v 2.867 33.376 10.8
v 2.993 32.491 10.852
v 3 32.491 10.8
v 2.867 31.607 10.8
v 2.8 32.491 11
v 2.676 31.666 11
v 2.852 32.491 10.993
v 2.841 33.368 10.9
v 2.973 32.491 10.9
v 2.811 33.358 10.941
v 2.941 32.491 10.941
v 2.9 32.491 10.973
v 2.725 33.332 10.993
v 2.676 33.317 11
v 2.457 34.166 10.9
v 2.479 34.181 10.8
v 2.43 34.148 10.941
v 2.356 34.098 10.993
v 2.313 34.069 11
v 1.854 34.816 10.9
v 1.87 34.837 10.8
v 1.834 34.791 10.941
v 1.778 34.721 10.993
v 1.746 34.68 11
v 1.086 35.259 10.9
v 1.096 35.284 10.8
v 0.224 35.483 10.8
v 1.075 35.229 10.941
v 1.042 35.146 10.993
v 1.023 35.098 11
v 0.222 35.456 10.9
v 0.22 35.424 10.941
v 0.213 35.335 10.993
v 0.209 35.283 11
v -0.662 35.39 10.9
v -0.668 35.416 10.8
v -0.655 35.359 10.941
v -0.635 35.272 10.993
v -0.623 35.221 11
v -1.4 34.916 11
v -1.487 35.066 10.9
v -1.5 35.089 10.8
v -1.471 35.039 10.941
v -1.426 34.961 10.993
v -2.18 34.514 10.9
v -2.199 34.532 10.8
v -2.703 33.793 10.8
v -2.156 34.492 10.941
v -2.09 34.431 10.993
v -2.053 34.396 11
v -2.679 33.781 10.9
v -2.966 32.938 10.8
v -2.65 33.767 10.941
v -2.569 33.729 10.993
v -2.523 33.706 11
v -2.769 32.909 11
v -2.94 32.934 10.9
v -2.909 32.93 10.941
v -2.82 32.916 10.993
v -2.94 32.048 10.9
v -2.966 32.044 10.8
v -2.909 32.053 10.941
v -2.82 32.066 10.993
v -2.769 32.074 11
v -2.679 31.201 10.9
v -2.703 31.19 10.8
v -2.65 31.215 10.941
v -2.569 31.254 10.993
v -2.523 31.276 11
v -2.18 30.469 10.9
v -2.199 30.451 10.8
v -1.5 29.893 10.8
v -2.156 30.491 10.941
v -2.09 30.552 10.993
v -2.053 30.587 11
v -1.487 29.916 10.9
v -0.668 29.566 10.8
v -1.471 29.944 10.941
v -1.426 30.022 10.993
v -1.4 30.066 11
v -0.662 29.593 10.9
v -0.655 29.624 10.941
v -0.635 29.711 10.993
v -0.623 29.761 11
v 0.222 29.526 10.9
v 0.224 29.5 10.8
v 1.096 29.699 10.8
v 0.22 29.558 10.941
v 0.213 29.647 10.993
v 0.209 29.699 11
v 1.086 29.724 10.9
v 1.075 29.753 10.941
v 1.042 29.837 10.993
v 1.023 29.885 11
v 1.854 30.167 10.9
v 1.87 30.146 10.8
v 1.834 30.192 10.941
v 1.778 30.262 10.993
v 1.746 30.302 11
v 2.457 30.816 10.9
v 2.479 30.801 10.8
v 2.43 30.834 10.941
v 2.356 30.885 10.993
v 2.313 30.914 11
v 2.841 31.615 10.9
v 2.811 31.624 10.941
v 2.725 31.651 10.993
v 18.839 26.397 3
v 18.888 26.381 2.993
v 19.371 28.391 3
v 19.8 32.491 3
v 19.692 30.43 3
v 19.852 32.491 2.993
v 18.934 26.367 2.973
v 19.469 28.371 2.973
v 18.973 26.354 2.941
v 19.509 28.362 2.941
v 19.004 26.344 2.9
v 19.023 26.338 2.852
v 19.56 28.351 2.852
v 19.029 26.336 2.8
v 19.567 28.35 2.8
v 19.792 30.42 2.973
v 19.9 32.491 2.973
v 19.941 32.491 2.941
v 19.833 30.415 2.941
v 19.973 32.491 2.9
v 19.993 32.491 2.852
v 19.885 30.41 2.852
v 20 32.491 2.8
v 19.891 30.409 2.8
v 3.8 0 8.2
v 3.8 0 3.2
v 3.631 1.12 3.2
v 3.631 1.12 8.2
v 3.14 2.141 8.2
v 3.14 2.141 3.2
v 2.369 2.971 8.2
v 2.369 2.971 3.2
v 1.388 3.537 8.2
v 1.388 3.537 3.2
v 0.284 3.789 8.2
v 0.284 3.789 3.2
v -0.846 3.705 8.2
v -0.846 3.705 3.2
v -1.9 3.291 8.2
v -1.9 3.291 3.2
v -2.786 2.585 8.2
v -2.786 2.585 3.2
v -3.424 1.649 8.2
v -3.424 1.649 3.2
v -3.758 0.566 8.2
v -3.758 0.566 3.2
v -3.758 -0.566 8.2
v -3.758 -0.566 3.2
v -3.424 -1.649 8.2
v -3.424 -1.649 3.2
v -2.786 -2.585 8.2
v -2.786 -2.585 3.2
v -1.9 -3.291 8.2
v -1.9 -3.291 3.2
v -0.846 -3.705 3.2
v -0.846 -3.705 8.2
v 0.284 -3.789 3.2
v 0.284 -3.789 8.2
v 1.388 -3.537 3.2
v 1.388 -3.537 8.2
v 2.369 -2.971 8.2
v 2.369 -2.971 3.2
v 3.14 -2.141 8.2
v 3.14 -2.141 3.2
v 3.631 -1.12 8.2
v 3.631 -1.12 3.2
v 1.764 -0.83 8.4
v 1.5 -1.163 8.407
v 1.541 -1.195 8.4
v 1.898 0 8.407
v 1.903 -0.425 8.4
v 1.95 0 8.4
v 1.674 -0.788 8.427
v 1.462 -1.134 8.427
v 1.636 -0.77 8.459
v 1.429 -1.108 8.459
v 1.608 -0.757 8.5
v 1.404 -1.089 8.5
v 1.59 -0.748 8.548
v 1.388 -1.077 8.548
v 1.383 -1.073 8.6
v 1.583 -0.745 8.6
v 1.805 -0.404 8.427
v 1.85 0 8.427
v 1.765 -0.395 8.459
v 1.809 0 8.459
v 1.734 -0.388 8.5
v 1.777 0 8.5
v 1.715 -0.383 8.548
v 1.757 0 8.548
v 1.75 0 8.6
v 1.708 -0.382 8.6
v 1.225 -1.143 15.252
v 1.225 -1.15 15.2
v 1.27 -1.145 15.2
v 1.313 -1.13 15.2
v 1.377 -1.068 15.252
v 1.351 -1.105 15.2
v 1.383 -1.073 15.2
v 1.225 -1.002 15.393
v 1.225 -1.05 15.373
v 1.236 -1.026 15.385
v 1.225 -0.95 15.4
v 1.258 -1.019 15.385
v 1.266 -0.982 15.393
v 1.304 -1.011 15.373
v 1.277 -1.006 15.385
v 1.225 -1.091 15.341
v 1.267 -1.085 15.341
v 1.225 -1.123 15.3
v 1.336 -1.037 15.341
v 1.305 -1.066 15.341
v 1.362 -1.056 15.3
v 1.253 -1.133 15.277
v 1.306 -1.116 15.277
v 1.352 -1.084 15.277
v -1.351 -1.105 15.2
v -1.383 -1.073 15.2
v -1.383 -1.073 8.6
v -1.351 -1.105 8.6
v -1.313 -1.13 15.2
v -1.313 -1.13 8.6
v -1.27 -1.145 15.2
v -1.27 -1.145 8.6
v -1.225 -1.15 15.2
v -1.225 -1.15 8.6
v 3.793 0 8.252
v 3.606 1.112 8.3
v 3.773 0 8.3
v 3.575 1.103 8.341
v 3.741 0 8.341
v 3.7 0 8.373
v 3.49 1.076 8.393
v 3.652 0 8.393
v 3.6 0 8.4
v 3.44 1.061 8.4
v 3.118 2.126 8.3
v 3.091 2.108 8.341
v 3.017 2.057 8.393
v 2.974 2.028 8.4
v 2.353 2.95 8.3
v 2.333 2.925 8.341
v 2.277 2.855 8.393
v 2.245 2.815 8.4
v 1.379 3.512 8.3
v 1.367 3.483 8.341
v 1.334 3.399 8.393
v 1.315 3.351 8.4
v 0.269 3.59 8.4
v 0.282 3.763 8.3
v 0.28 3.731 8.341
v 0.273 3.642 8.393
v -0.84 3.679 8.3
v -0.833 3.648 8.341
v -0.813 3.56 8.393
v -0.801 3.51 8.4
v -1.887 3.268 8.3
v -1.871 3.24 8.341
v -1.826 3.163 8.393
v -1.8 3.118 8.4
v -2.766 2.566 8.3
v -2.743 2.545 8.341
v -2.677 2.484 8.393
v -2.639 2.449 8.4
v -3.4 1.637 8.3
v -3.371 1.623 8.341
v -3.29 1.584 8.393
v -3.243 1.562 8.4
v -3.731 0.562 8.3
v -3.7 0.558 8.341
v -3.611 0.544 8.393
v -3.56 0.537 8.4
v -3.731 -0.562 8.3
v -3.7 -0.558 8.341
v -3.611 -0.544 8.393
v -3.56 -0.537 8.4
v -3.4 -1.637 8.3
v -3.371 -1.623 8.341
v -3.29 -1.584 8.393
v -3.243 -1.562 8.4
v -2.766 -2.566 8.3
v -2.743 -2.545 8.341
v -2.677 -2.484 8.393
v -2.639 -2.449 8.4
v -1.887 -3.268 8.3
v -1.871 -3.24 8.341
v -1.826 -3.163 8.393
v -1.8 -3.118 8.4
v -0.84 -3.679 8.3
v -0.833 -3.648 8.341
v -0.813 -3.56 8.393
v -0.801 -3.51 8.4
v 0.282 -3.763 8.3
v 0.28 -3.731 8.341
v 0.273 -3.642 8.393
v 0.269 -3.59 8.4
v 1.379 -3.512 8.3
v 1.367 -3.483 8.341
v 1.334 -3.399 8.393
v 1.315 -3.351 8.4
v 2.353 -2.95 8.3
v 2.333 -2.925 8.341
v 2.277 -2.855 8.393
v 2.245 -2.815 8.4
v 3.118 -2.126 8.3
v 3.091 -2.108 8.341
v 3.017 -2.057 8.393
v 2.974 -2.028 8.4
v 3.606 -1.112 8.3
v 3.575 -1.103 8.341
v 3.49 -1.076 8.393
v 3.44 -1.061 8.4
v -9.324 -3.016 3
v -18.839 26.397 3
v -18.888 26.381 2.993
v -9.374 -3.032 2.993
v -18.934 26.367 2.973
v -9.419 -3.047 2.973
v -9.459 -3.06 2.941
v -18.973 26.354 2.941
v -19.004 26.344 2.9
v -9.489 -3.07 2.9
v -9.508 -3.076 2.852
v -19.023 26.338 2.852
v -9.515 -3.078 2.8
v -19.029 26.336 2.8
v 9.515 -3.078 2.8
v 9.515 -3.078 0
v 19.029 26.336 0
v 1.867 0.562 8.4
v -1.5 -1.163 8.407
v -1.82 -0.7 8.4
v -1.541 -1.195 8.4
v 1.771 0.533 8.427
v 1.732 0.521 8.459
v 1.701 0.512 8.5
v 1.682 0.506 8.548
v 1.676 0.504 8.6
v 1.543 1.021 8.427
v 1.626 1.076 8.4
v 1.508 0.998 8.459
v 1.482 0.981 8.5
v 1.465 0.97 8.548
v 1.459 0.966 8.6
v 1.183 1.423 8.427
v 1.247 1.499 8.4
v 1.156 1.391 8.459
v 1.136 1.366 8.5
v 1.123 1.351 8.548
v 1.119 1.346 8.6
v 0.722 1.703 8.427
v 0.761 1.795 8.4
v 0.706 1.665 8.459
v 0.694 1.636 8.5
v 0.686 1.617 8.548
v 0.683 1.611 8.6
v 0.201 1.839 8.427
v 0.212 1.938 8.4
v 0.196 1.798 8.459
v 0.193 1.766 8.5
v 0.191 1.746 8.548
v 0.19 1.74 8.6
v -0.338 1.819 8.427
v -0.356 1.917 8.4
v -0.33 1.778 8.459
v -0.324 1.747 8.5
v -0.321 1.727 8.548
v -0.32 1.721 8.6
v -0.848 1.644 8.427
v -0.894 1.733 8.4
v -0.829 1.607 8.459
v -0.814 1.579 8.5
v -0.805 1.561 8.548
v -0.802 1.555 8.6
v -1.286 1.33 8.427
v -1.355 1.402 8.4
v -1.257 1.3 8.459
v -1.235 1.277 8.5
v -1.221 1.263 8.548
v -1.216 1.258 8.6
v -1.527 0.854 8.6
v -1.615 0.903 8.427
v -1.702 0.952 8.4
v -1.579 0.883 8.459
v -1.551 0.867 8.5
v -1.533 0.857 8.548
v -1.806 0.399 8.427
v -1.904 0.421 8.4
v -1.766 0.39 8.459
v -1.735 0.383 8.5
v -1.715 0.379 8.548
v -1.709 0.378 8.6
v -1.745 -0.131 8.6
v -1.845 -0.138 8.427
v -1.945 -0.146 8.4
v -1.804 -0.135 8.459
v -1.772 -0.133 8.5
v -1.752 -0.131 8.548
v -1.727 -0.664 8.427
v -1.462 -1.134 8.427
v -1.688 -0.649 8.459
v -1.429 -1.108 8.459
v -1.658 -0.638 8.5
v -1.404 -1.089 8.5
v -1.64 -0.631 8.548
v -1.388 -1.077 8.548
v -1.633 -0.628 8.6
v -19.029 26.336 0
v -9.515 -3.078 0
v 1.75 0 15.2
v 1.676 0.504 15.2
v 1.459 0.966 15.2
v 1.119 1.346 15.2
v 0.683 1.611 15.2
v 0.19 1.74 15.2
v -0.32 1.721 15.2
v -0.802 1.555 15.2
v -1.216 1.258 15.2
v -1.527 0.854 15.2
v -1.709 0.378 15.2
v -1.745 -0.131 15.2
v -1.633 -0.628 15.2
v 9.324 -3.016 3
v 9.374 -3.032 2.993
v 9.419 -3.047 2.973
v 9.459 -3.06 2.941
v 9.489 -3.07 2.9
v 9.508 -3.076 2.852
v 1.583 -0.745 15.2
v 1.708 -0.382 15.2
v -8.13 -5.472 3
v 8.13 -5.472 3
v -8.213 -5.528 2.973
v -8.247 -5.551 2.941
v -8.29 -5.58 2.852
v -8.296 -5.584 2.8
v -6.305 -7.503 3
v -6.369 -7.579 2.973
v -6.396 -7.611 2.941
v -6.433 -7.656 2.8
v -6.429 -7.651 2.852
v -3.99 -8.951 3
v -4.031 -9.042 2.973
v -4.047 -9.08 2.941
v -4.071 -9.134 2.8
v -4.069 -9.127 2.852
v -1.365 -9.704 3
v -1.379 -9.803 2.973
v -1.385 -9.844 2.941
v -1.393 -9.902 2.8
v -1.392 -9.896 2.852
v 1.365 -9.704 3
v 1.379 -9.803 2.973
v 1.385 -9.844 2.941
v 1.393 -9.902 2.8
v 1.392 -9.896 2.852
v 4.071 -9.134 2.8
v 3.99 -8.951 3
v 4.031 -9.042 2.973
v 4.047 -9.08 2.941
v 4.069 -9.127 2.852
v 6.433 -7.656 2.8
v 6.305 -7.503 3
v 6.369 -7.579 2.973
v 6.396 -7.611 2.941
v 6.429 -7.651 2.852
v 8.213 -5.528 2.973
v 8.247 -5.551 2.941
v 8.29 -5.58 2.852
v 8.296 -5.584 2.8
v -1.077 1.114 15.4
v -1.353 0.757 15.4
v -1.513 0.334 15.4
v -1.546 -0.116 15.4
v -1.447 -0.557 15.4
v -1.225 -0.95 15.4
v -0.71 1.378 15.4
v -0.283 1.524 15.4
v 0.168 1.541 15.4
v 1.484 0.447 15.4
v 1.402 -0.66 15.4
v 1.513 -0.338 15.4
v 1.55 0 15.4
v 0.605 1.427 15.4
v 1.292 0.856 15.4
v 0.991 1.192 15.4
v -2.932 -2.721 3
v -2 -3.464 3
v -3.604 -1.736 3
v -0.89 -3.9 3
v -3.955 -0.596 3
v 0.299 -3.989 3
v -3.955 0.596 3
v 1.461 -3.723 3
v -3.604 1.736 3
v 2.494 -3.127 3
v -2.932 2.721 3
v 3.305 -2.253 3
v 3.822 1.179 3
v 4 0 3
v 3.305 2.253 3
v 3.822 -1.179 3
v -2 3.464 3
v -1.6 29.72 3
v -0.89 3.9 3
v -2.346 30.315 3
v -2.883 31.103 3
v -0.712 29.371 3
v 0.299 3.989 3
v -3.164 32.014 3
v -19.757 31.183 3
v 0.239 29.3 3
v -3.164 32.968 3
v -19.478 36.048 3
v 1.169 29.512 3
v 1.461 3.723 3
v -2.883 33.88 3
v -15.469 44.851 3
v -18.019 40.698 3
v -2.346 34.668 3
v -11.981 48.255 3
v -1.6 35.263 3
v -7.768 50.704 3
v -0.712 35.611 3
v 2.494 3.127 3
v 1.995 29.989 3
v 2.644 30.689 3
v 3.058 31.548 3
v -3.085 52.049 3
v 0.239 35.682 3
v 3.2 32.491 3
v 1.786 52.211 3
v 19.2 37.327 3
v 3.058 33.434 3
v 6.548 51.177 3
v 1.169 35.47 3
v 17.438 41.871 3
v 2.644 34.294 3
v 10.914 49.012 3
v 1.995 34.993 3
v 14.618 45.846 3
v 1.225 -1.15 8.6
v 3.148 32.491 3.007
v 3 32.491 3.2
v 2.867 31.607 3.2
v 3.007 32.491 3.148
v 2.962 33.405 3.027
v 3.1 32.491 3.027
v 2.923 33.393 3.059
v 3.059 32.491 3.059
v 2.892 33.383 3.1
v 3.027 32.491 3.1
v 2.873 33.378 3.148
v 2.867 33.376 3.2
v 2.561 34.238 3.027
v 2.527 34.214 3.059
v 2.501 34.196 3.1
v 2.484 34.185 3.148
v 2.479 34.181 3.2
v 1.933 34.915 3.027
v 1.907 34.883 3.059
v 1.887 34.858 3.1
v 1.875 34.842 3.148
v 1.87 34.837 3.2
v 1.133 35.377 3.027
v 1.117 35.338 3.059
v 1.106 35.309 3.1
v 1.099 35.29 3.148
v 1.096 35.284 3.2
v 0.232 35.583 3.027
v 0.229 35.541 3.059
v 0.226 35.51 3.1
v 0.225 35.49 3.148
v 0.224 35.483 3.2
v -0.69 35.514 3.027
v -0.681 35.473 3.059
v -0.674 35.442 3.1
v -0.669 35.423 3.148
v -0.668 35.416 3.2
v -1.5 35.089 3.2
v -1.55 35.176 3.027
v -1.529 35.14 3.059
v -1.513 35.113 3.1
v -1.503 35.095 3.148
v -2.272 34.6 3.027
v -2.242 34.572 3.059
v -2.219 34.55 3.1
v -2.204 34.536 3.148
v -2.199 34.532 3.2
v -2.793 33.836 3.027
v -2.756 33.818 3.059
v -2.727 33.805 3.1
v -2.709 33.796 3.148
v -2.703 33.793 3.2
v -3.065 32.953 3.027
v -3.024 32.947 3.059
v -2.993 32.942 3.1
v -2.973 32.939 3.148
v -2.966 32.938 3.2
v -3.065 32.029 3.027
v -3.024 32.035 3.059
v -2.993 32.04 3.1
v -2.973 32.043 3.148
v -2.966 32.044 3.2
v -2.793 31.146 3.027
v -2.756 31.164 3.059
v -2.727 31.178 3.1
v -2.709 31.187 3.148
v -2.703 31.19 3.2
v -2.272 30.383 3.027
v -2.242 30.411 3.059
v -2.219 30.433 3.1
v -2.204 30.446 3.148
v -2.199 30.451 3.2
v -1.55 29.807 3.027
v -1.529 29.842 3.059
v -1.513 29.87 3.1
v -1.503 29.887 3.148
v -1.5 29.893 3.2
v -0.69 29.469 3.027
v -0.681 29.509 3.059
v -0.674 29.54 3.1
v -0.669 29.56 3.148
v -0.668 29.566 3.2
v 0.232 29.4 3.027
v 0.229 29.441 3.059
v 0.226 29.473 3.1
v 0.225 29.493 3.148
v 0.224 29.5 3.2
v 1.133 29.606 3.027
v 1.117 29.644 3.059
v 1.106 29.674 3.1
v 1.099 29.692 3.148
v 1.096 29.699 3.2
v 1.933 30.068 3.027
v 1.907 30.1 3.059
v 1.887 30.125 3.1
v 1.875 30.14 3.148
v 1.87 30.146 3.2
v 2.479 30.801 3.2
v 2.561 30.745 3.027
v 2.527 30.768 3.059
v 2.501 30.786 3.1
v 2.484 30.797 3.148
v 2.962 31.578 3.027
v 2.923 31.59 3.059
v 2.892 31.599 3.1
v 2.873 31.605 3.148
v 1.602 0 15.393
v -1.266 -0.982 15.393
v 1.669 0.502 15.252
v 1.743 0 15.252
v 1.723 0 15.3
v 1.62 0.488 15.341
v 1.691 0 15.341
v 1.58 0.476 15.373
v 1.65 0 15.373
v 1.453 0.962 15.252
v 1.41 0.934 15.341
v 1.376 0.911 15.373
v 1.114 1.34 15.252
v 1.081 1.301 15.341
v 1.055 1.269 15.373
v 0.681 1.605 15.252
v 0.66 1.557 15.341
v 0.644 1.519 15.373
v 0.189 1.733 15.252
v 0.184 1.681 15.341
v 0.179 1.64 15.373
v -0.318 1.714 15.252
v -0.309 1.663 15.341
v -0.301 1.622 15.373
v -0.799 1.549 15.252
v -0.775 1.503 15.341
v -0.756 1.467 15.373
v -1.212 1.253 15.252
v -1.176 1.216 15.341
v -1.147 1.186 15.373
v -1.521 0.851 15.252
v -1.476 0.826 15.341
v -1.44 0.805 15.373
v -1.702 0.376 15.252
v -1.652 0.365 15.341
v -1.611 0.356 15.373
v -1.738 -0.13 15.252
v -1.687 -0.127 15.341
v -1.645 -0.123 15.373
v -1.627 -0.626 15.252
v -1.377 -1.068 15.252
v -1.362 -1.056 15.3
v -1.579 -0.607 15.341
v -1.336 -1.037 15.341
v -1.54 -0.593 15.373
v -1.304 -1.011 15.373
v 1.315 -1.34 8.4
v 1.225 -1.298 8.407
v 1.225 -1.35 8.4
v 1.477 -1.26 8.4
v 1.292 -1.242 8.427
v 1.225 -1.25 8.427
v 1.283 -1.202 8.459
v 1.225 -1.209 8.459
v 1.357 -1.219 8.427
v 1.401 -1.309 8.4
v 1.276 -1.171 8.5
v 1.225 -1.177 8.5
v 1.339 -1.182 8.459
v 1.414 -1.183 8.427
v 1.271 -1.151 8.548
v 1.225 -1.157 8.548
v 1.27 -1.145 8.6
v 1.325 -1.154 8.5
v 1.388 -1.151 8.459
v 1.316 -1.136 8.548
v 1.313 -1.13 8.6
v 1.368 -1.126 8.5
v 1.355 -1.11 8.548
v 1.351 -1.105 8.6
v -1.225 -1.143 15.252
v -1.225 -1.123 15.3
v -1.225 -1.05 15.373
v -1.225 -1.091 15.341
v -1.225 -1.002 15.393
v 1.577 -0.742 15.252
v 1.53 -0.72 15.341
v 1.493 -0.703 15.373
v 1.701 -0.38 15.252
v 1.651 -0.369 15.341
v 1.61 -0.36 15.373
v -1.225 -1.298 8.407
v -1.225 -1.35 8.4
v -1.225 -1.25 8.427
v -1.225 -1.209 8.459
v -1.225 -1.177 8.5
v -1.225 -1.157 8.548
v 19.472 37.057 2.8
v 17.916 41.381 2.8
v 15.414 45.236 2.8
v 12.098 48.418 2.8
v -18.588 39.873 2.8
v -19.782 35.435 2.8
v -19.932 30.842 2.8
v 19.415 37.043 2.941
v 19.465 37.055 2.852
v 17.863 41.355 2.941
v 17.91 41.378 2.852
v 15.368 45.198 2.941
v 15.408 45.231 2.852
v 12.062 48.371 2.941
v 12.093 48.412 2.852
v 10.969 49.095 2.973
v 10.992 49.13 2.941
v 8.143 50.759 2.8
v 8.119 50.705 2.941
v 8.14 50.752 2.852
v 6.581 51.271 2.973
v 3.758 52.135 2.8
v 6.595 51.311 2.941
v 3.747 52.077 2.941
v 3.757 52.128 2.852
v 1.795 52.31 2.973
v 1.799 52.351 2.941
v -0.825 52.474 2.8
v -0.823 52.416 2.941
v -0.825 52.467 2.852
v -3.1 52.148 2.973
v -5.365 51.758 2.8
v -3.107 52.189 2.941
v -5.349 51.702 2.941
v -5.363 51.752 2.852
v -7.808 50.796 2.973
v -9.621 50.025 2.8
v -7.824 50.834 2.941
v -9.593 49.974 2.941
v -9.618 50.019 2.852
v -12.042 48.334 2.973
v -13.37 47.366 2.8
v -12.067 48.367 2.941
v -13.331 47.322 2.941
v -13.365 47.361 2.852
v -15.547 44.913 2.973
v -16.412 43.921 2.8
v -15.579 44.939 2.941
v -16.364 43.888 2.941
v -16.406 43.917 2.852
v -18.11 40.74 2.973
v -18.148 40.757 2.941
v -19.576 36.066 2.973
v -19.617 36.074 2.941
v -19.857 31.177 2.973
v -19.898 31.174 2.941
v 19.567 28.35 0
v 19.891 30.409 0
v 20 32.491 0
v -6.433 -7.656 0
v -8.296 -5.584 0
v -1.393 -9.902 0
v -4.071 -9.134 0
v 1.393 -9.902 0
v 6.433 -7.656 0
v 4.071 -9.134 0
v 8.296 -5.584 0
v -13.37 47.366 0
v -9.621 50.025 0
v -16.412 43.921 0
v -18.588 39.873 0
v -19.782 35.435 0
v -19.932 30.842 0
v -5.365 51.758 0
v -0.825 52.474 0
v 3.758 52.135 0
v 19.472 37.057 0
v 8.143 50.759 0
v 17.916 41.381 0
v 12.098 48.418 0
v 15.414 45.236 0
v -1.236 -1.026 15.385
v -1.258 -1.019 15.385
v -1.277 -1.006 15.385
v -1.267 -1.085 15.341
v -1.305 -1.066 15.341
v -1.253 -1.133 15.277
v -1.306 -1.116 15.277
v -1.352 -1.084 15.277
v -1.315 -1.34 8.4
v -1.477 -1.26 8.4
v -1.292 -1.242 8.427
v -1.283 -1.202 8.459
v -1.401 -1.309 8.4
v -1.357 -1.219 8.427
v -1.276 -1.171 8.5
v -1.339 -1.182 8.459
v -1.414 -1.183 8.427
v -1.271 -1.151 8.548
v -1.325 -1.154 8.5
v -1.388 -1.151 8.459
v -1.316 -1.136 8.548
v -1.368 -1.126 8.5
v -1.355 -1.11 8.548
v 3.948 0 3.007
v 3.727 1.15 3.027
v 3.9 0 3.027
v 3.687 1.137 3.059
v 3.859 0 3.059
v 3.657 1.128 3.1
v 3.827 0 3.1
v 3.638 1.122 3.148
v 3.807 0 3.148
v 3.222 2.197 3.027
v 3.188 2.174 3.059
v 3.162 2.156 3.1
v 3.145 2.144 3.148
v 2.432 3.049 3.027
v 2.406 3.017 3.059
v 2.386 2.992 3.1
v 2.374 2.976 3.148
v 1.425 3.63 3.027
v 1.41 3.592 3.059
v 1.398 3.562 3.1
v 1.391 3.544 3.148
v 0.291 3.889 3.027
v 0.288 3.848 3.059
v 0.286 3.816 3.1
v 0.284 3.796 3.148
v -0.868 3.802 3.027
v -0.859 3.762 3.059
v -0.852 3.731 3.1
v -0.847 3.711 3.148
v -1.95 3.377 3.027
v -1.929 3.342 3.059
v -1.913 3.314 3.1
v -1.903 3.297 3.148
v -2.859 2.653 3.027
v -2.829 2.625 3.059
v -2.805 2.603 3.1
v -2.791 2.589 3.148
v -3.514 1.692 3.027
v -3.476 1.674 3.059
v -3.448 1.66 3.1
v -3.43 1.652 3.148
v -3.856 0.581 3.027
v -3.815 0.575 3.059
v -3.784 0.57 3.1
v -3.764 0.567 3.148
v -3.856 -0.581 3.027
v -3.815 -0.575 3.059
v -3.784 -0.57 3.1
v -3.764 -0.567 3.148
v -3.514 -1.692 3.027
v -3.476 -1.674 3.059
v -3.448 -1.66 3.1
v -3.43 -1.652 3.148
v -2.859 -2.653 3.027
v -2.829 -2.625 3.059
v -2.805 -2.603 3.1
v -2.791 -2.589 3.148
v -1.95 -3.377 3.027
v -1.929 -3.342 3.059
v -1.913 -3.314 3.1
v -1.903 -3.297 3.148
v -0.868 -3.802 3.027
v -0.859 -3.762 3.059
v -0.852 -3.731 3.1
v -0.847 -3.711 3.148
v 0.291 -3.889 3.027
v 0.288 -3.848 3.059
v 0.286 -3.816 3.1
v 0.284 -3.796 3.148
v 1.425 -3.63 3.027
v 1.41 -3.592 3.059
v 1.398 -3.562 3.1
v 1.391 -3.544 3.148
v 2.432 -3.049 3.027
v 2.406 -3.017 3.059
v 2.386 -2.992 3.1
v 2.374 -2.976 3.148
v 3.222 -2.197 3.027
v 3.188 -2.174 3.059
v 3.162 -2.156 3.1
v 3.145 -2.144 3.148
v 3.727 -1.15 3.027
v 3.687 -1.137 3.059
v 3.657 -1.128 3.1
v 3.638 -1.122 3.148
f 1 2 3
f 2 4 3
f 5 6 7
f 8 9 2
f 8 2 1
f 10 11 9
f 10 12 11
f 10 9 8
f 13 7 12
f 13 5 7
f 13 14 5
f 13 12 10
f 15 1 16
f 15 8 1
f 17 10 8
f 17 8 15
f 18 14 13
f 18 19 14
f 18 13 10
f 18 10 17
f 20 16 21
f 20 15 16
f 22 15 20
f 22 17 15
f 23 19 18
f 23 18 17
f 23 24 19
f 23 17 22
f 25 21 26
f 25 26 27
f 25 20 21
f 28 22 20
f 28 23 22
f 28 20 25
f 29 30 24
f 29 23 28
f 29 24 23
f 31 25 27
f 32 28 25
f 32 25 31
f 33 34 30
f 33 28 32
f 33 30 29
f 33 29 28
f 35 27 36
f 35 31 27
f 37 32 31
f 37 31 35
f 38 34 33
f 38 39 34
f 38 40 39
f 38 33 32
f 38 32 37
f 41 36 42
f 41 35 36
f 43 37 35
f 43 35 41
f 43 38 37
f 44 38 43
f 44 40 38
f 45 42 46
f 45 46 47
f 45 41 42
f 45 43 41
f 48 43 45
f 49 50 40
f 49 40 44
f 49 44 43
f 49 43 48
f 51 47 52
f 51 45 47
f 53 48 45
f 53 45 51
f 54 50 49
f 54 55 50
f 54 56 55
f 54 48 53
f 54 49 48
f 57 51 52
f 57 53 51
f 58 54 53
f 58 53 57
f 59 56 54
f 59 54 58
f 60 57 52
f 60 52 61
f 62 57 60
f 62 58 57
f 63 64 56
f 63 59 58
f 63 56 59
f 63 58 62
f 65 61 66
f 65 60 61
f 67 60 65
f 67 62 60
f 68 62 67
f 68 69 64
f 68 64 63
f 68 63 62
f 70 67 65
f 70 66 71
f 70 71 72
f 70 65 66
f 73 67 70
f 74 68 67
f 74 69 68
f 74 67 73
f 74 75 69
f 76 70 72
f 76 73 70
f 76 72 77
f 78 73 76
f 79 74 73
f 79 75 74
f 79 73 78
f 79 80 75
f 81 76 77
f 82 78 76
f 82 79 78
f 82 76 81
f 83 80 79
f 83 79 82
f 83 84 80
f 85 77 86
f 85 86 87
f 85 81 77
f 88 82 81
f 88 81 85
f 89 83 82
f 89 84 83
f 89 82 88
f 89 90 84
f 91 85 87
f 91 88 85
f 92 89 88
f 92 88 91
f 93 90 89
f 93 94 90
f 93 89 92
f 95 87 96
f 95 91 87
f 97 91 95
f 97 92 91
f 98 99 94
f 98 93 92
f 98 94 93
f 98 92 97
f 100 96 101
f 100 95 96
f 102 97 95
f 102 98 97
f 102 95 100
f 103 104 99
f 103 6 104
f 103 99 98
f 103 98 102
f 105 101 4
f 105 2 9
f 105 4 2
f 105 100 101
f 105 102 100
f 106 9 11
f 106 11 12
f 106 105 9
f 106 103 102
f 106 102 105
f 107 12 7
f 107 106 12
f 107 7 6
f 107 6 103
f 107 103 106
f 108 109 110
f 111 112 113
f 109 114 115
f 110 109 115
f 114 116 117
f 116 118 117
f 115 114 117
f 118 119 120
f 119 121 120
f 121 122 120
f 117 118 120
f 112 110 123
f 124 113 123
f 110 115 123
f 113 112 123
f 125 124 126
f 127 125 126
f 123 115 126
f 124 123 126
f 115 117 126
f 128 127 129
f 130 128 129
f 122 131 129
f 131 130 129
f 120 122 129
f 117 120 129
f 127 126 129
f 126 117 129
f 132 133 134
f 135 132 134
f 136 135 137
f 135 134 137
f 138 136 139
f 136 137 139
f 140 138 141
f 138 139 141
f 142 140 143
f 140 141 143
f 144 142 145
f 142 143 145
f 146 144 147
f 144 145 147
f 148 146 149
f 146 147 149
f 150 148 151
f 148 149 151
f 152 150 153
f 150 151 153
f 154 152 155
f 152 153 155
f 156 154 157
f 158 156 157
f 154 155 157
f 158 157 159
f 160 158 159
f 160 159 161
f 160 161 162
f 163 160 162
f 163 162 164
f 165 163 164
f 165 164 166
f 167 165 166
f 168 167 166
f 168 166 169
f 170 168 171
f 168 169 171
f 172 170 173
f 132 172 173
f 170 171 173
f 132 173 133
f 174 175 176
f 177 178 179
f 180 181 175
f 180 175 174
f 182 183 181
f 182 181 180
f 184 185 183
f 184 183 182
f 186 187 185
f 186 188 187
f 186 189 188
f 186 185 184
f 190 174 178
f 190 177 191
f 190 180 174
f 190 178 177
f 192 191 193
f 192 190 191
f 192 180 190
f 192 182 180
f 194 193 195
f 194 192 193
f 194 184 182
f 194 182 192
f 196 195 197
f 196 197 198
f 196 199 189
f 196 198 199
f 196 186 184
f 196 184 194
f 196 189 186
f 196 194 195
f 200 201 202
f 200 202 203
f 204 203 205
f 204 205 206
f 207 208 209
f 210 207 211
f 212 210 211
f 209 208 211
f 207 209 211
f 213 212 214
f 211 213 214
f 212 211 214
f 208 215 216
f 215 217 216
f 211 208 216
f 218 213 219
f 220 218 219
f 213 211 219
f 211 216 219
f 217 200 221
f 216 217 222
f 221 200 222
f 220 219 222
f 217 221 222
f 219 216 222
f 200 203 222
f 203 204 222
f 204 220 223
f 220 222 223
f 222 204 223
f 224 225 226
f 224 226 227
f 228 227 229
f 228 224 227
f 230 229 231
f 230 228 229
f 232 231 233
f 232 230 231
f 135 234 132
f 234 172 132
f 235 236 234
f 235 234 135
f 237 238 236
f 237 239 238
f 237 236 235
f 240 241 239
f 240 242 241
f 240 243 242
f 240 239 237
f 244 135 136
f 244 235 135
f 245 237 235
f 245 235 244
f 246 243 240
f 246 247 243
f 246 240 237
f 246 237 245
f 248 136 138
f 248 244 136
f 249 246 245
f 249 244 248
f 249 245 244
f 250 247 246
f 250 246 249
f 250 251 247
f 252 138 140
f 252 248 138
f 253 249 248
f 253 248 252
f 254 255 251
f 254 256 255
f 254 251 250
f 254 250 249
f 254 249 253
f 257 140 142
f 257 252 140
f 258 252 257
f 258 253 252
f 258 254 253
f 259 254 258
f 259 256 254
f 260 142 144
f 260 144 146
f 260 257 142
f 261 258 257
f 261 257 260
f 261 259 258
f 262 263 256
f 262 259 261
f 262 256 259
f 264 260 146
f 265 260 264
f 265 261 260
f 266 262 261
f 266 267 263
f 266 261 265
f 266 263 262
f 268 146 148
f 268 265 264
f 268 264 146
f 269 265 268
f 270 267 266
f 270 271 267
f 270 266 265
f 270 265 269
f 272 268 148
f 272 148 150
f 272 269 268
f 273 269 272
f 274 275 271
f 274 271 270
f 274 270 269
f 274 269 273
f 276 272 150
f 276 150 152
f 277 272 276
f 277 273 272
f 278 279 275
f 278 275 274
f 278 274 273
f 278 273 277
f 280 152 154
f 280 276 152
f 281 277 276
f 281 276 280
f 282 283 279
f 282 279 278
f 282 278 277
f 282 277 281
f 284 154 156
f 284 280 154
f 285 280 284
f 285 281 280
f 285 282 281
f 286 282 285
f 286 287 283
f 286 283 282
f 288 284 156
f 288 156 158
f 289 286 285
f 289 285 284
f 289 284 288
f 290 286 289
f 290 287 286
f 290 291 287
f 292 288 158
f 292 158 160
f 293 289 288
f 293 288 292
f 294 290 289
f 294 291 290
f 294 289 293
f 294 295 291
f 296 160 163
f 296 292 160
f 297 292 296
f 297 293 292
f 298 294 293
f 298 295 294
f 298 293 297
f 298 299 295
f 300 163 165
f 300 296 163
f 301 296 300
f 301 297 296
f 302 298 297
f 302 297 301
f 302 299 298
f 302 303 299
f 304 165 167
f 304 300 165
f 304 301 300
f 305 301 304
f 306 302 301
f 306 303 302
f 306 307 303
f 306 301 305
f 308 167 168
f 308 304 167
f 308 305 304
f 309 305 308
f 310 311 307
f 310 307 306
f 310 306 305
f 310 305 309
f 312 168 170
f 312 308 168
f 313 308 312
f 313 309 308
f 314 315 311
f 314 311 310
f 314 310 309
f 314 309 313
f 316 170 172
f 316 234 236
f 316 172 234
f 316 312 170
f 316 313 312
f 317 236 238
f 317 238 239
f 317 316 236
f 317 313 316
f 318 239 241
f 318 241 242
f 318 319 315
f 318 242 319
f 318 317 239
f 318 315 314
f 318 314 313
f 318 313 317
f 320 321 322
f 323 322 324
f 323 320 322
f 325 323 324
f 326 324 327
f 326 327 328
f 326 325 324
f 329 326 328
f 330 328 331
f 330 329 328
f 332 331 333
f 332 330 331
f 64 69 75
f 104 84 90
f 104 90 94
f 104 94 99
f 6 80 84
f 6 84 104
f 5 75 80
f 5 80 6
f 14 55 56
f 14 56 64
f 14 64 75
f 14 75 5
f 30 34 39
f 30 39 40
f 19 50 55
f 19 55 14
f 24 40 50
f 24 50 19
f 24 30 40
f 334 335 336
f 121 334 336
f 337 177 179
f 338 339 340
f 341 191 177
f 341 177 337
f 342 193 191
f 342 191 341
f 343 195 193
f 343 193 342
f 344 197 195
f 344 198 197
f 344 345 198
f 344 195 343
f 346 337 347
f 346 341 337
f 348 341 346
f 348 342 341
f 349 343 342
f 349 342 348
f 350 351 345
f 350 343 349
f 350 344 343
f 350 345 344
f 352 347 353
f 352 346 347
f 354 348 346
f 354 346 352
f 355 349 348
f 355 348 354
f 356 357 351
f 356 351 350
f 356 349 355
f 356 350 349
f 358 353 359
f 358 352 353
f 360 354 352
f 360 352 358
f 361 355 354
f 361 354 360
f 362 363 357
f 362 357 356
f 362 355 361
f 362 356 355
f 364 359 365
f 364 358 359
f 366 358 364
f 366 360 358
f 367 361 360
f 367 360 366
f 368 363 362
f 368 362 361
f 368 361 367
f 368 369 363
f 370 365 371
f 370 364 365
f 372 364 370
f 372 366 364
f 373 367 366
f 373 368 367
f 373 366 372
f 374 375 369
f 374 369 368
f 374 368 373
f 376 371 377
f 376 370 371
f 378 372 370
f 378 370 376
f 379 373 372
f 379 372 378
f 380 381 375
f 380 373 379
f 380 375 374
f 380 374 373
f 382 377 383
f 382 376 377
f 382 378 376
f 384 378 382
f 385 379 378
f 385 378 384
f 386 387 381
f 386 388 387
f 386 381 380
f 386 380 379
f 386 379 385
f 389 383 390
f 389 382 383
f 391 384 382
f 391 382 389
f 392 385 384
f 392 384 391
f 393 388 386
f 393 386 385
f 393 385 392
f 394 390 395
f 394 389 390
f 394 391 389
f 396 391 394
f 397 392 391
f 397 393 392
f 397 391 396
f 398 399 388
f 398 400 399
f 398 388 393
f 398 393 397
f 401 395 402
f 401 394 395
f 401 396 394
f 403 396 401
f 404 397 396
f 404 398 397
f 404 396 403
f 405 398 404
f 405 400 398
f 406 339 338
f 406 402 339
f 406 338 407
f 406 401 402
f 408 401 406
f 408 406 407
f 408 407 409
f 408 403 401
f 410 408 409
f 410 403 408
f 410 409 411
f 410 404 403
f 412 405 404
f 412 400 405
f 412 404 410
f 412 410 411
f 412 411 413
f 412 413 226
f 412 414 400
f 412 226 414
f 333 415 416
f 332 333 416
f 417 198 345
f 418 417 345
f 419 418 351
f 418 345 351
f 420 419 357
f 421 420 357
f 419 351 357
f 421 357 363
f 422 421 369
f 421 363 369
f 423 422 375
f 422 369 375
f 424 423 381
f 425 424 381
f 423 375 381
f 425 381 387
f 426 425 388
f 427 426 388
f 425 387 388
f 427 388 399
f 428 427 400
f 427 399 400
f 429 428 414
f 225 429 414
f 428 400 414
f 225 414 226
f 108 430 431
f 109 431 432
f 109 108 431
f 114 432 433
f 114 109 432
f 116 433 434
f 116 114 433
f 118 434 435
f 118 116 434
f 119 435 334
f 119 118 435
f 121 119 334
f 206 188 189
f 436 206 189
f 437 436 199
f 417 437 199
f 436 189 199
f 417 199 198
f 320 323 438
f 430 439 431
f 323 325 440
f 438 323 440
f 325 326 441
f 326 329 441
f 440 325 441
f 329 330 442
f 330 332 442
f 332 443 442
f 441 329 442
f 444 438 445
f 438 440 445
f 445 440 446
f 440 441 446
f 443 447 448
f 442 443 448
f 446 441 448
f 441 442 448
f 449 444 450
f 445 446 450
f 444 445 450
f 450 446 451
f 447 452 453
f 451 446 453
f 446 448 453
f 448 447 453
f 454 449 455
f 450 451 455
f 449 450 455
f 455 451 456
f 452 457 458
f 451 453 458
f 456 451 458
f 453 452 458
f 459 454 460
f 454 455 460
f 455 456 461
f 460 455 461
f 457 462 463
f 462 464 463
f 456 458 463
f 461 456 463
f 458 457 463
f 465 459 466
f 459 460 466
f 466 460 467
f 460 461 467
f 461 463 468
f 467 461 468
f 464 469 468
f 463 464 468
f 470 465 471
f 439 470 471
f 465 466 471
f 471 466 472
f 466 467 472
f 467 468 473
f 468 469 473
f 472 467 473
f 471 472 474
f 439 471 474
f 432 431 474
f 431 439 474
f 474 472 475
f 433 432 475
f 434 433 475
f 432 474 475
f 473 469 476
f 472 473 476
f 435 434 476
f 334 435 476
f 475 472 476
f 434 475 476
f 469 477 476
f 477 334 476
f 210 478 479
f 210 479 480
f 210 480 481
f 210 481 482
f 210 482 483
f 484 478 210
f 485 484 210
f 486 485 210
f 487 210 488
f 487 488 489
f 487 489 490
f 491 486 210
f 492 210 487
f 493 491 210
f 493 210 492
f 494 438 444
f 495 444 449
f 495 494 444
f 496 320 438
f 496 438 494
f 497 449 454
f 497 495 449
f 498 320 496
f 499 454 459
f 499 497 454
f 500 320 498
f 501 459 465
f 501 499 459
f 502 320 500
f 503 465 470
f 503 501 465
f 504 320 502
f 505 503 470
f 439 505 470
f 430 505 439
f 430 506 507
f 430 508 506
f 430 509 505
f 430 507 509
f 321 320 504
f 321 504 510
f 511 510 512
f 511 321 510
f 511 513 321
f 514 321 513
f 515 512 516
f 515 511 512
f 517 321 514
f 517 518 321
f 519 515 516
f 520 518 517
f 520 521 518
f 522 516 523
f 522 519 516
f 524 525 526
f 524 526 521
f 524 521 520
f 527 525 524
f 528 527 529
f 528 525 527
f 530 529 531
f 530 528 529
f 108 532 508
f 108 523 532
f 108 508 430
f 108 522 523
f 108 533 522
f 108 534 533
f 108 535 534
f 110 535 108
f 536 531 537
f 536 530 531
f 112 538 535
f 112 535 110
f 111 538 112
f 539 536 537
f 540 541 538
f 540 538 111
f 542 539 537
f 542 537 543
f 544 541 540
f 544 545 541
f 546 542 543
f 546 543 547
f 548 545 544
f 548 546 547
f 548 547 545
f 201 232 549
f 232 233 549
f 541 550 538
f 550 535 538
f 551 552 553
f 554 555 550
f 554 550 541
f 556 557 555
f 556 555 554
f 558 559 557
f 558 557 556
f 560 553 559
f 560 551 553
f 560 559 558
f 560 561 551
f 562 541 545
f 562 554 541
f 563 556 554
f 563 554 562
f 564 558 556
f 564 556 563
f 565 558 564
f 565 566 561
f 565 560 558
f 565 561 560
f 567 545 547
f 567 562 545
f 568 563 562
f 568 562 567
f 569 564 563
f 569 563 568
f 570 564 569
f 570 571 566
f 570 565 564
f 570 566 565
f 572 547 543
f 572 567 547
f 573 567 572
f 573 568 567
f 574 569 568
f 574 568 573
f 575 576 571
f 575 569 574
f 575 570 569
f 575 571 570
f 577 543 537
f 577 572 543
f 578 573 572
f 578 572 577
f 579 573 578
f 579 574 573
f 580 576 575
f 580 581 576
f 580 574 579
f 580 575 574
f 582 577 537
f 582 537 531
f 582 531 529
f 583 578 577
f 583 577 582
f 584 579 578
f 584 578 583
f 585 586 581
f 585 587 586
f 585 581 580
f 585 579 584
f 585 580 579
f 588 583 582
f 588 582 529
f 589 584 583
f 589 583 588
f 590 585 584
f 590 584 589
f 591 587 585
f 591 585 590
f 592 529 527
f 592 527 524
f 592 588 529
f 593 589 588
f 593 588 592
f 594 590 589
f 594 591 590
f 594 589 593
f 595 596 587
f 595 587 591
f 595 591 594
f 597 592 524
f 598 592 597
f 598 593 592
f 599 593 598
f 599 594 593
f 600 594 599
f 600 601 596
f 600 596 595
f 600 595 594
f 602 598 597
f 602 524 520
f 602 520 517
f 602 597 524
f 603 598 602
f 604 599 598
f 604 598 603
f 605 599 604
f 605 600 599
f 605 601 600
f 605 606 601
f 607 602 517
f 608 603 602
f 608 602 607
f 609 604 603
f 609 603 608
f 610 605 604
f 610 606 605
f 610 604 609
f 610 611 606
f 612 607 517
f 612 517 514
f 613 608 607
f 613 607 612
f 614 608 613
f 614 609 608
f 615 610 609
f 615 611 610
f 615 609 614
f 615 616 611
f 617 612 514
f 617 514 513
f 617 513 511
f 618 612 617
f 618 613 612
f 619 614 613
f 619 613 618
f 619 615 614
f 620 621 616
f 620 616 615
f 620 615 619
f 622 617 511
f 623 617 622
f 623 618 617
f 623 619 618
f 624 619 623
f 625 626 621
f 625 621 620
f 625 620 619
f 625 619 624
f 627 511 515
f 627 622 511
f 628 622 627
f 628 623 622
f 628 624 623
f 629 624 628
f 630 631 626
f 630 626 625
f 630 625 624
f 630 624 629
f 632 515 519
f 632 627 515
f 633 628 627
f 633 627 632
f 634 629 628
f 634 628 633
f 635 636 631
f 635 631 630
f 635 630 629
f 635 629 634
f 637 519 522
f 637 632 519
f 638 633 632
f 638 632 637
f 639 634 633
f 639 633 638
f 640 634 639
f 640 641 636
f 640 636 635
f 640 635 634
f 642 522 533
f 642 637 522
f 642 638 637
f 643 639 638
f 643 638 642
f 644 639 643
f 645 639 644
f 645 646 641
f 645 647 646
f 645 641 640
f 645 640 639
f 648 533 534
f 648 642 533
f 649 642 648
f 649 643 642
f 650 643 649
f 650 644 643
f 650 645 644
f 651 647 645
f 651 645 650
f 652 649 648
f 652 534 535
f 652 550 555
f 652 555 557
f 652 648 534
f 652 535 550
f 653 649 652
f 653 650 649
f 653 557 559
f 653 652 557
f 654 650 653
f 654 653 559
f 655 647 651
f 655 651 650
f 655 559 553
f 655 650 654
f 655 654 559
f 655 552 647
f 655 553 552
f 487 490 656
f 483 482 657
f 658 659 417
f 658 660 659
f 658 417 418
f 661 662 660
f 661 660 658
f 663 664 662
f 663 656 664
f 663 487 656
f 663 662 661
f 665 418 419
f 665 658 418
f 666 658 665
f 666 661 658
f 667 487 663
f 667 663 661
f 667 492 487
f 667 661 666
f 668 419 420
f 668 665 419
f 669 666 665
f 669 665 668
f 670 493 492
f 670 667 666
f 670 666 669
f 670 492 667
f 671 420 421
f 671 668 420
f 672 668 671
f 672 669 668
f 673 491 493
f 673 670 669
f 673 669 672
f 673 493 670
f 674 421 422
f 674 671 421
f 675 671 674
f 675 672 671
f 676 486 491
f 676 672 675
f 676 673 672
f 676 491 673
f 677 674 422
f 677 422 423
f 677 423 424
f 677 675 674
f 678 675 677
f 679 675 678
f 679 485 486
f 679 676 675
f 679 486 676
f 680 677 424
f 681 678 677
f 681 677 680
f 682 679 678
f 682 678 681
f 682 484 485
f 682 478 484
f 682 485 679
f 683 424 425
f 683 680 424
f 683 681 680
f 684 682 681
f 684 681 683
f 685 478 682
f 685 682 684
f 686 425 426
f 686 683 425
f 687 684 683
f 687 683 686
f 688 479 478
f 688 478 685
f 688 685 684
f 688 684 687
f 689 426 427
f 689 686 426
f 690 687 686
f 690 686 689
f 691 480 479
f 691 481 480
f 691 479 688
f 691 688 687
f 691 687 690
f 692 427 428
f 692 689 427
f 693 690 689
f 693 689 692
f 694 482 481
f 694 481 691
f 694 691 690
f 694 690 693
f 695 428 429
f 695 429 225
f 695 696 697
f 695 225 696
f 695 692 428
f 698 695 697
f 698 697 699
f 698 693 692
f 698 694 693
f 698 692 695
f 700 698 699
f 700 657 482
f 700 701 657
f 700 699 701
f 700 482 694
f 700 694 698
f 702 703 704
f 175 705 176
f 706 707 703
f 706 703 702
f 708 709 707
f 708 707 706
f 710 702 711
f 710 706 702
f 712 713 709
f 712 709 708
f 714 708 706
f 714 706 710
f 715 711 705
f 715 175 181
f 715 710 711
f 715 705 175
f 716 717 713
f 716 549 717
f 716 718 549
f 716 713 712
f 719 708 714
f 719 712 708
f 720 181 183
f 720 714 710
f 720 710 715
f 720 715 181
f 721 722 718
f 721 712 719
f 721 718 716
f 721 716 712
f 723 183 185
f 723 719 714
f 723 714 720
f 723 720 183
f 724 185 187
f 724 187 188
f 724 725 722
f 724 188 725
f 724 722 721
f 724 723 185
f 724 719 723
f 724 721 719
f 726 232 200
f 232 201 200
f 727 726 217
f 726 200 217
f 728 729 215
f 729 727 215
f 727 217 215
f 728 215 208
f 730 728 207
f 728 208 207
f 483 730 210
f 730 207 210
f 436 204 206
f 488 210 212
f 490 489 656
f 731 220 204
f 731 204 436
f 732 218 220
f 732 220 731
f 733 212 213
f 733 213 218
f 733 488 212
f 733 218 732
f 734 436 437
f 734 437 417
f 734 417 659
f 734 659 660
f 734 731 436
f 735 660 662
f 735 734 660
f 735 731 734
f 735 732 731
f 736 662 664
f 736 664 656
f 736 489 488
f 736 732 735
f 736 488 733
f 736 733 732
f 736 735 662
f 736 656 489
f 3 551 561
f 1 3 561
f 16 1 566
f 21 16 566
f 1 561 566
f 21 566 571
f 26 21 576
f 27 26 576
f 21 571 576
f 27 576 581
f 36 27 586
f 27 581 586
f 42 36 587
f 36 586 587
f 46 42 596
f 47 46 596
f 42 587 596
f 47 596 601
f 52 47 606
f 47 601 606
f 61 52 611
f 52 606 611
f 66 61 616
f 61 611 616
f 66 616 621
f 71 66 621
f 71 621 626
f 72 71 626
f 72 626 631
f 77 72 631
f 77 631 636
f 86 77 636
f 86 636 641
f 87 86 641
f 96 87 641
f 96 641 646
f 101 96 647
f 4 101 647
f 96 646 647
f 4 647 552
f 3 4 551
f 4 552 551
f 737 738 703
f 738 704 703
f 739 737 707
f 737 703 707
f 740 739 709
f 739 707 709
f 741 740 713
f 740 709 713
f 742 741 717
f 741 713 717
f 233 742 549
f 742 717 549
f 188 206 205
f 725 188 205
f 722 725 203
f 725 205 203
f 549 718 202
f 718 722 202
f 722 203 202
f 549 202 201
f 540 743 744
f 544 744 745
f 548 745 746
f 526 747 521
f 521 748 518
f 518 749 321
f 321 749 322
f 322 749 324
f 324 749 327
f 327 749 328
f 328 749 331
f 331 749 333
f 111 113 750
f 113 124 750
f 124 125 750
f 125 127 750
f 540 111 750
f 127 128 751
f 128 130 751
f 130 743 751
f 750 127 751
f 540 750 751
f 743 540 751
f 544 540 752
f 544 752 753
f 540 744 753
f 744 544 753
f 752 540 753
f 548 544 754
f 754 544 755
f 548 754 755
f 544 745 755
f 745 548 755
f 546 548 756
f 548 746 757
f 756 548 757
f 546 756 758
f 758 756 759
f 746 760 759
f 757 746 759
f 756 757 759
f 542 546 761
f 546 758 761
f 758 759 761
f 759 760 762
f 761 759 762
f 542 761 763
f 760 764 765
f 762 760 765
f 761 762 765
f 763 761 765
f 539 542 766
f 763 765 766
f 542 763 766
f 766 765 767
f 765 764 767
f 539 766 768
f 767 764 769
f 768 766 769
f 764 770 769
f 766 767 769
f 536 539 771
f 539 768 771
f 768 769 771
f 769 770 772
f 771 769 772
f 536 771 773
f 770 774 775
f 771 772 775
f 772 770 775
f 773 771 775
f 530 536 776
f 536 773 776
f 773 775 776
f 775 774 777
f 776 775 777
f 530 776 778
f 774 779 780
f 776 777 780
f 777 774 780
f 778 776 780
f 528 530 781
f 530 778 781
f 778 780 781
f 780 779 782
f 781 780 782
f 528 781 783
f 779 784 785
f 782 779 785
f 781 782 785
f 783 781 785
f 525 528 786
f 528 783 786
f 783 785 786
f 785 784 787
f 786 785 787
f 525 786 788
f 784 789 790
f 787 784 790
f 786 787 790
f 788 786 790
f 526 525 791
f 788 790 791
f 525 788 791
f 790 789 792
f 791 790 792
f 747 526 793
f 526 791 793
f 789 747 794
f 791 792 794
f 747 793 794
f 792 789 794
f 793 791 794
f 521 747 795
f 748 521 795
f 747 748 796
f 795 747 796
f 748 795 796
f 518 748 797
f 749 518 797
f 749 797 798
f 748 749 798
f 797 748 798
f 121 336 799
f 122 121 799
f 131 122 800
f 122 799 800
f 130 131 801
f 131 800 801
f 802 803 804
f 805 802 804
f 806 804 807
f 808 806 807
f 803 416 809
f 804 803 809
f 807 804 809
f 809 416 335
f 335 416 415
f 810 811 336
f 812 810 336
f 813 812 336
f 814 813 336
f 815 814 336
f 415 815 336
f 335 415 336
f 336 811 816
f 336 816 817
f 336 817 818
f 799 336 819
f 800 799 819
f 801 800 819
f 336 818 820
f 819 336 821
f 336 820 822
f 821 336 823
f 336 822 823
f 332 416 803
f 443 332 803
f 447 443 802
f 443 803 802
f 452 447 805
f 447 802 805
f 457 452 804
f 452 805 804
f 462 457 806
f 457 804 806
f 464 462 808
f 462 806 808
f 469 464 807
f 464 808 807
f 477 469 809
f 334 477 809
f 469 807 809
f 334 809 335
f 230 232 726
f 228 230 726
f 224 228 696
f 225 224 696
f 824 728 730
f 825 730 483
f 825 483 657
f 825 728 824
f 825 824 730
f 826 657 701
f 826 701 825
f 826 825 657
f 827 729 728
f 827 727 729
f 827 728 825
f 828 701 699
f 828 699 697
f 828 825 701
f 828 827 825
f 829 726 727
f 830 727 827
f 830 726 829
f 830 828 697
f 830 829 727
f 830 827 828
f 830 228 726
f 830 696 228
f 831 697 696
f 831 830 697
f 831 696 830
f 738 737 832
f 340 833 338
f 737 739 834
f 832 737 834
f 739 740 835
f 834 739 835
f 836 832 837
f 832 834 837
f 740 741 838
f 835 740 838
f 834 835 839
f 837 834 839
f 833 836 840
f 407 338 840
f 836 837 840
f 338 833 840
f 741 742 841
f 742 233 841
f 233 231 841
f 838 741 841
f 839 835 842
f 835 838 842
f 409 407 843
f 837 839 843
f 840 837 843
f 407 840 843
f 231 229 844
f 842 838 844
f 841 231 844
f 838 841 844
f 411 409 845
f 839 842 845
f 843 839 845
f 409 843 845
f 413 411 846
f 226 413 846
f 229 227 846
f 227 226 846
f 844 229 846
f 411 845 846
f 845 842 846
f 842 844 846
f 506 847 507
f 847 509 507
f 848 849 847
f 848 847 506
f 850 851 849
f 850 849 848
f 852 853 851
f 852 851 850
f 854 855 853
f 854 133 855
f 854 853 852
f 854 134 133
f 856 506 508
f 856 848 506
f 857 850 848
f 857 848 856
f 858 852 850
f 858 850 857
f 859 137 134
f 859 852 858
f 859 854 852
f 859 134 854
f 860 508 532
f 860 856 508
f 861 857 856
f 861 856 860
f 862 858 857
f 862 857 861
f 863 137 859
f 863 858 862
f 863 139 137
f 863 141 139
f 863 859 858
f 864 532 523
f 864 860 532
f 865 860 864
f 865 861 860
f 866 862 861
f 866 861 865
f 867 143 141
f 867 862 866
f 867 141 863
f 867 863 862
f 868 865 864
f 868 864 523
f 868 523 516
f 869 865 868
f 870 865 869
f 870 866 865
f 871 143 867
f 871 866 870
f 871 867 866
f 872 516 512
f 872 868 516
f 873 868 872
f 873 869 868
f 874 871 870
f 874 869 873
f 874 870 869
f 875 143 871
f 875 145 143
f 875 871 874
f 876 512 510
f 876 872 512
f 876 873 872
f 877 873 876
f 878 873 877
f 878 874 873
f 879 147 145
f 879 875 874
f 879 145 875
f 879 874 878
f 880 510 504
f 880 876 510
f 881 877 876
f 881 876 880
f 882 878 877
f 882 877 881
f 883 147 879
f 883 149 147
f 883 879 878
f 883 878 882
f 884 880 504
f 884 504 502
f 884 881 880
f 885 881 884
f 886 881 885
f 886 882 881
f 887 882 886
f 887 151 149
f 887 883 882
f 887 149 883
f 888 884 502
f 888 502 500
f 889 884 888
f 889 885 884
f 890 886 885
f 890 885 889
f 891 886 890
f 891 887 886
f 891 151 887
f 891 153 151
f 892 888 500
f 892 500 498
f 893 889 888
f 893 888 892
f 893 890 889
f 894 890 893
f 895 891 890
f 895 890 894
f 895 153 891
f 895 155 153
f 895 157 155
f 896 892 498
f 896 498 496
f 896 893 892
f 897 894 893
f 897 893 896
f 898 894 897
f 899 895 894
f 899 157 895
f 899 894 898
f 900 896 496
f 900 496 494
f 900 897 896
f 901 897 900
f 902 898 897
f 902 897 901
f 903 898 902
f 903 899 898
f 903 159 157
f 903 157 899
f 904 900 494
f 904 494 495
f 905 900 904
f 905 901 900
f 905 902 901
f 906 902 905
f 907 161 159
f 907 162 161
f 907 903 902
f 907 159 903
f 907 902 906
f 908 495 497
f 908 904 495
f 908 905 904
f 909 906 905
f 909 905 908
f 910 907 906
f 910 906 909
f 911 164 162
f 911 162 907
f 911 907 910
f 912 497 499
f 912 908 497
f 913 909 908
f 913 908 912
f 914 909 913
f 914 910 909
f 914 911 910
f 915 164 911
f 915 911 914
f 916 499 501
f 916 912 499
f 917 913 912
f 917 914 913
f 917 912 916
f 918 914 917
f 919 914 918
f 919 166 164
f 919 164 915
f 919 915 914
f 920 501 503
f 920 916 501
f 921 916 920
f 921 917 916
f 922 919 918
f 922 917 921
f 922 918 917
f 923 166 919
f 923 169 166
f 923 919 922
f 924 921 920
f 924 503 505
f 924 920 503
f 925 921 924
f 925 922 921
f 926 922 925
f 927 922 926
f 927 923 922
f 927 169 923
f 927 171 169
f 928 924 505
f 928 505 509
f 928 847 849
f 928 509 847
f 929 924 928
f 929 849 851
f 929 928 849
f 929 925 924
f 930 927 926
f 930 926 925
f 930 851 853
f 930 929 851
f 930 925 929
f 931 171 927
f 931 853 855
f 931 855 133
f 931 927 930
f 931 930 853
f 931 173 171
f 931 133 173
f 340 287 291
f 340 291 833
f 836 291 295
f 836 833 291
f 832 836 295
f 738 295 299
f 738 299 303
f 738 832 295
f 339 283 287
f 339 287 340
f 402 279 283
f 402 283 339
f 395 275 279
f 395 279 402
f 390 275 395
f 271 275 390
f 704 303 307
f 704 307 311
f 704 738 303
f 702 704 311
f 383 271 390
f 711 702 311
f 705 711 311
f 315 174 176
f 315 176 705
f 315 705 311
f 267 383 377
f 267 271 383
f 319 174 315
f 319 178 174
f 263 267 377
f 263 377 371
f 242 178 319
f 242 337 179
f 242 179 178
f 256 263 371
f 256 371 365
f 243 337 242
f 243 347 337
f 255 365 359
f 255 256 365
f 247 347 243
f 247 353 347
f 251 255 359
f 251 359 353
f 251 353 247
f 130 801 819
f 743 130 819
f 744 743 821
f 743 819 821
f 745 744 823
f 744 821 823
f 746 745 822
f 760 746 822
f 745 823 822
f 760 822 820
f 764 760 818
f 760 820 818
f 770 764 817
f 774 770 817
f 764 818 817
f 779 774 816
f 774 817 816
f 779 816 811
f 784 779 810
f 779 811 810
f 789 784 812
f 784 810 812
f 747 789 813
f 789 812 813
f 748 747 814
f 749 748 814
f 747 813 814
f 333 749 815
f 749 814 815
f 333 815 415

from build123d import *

# Parameters (mm, degrees)
F1_DEPTH = 3
F2_R     = 3
F3_DEPTH = 8
F4_R     = 3.8
F5_DEPTH = 5.4
F7_DEPTH = 7
F8_R     = 0.2


with BuildPart() as f1:
    # F0 (on Top) → F1 (new body)
    with BuildSketch(Plane.XY):
        with BuildLine():
            ThreePointArc((19.0291819997, 26.3357413656), (19.7558047165, 29.3754503593), (20, 32.4912456033))
            ThreePointArc((20, 32.4912456033), (-3.115795244, 52.2470503198), (-19.0291819997, 26.3357413656))
            ThreePointArc((-19.0291819997, 26.3357413656), (0, 12.4912456033), (19.0291819997, 26.3357413656))
        make_face()
        with BuildLine():
            ThreePointArc((10, 0), (-1.557897622, 9.8779023583), (-9.5145909999, -3.0777521189))
            ThreePointArc((-9.5145909999, -3.0777521189), (0, -10), (9.5145909999, -3.0777521189))
            ThreePointArc((9.5145909999, -3.0777521189), (9.8779023583, -1.557897622), (10, 0))
        make_face()
        with BuildLine():
            ThreePointArc((19.0291819997, 26.3357413656), (0, 12.4912456033), (-19.0291819997, 26.3357413656))
            Line((-19.0291819997, 26.3357413656), (-9.5145909999, -3.0777521189))
            ThreePointArc((-9.5145909999, -3.0777521189), (-1.557897622, 9.8779023583), (10, 0))
            ThreePointArc((10, 0), (9.8779023583, -1.557897622), (9.5145909999, -3.0777521189))
            Line((9.5145909999, -3.0777521189), (19.0291819997, 26.3357413656))
        make_face()
    extrude(amount=F1_DEPTH)

    # F2 (on face) → F3 (join)
    with BuildSketch(Plane.XY.offset(3)):
        with Locations((0, 32.4912456033)):
            Circle(F2_R)
    extrude(amount=F3_DEPTH)

    # F4 (on face) → F5 (join)
    with BuildSketch(Plane.XY.offset(3)):
        Circle(F4_R)
    extrude(amount=F5_DEPTH)

    # F6 (on face) → F7 (join)
    with BuildSketch(Plane.XY.offset(8.4)):
        with BuildLine():
            ThreePointArc((1.3190905958, -1.15), (1.6387355709, -0.6140404943), (1.75, 0))
            ThreePointArc((1.75, 0), (-0.6140404943, 1.6387355709), (-1.3190905958, -1.15))
            Line((-1.3190905958, -1.15), (1.3190905958, -1.15))
        make_face()
    extrude(amount=F7_DEPTH)

    # F8
    f8_edges = [f1.edges().sort_by_distance(p)[0] for p in [
        (-3, 32.491246, 11),
        (0, -1.15, 15.4),
        (0, 1.75, 15.4),
        (-3.8, 0, 8.4),
        (0, -1.15, 8.4),
        (0, 1.75, 8.4),
        (-14.271886, 11.628995, 3),
        (0, 52.491246, 3),
        (0, -10, 3),
        (14.271886, 11.628995, 3),
        (-3.8, 0, 3),
        (-3, 32.491246, 3),
        (-1.319091, -1.15, 11.9),
        (1.319091, -1.15, 11.9),
    ]]
    fillet(f8_edges, radius=F8_R)


solid = f1.part
